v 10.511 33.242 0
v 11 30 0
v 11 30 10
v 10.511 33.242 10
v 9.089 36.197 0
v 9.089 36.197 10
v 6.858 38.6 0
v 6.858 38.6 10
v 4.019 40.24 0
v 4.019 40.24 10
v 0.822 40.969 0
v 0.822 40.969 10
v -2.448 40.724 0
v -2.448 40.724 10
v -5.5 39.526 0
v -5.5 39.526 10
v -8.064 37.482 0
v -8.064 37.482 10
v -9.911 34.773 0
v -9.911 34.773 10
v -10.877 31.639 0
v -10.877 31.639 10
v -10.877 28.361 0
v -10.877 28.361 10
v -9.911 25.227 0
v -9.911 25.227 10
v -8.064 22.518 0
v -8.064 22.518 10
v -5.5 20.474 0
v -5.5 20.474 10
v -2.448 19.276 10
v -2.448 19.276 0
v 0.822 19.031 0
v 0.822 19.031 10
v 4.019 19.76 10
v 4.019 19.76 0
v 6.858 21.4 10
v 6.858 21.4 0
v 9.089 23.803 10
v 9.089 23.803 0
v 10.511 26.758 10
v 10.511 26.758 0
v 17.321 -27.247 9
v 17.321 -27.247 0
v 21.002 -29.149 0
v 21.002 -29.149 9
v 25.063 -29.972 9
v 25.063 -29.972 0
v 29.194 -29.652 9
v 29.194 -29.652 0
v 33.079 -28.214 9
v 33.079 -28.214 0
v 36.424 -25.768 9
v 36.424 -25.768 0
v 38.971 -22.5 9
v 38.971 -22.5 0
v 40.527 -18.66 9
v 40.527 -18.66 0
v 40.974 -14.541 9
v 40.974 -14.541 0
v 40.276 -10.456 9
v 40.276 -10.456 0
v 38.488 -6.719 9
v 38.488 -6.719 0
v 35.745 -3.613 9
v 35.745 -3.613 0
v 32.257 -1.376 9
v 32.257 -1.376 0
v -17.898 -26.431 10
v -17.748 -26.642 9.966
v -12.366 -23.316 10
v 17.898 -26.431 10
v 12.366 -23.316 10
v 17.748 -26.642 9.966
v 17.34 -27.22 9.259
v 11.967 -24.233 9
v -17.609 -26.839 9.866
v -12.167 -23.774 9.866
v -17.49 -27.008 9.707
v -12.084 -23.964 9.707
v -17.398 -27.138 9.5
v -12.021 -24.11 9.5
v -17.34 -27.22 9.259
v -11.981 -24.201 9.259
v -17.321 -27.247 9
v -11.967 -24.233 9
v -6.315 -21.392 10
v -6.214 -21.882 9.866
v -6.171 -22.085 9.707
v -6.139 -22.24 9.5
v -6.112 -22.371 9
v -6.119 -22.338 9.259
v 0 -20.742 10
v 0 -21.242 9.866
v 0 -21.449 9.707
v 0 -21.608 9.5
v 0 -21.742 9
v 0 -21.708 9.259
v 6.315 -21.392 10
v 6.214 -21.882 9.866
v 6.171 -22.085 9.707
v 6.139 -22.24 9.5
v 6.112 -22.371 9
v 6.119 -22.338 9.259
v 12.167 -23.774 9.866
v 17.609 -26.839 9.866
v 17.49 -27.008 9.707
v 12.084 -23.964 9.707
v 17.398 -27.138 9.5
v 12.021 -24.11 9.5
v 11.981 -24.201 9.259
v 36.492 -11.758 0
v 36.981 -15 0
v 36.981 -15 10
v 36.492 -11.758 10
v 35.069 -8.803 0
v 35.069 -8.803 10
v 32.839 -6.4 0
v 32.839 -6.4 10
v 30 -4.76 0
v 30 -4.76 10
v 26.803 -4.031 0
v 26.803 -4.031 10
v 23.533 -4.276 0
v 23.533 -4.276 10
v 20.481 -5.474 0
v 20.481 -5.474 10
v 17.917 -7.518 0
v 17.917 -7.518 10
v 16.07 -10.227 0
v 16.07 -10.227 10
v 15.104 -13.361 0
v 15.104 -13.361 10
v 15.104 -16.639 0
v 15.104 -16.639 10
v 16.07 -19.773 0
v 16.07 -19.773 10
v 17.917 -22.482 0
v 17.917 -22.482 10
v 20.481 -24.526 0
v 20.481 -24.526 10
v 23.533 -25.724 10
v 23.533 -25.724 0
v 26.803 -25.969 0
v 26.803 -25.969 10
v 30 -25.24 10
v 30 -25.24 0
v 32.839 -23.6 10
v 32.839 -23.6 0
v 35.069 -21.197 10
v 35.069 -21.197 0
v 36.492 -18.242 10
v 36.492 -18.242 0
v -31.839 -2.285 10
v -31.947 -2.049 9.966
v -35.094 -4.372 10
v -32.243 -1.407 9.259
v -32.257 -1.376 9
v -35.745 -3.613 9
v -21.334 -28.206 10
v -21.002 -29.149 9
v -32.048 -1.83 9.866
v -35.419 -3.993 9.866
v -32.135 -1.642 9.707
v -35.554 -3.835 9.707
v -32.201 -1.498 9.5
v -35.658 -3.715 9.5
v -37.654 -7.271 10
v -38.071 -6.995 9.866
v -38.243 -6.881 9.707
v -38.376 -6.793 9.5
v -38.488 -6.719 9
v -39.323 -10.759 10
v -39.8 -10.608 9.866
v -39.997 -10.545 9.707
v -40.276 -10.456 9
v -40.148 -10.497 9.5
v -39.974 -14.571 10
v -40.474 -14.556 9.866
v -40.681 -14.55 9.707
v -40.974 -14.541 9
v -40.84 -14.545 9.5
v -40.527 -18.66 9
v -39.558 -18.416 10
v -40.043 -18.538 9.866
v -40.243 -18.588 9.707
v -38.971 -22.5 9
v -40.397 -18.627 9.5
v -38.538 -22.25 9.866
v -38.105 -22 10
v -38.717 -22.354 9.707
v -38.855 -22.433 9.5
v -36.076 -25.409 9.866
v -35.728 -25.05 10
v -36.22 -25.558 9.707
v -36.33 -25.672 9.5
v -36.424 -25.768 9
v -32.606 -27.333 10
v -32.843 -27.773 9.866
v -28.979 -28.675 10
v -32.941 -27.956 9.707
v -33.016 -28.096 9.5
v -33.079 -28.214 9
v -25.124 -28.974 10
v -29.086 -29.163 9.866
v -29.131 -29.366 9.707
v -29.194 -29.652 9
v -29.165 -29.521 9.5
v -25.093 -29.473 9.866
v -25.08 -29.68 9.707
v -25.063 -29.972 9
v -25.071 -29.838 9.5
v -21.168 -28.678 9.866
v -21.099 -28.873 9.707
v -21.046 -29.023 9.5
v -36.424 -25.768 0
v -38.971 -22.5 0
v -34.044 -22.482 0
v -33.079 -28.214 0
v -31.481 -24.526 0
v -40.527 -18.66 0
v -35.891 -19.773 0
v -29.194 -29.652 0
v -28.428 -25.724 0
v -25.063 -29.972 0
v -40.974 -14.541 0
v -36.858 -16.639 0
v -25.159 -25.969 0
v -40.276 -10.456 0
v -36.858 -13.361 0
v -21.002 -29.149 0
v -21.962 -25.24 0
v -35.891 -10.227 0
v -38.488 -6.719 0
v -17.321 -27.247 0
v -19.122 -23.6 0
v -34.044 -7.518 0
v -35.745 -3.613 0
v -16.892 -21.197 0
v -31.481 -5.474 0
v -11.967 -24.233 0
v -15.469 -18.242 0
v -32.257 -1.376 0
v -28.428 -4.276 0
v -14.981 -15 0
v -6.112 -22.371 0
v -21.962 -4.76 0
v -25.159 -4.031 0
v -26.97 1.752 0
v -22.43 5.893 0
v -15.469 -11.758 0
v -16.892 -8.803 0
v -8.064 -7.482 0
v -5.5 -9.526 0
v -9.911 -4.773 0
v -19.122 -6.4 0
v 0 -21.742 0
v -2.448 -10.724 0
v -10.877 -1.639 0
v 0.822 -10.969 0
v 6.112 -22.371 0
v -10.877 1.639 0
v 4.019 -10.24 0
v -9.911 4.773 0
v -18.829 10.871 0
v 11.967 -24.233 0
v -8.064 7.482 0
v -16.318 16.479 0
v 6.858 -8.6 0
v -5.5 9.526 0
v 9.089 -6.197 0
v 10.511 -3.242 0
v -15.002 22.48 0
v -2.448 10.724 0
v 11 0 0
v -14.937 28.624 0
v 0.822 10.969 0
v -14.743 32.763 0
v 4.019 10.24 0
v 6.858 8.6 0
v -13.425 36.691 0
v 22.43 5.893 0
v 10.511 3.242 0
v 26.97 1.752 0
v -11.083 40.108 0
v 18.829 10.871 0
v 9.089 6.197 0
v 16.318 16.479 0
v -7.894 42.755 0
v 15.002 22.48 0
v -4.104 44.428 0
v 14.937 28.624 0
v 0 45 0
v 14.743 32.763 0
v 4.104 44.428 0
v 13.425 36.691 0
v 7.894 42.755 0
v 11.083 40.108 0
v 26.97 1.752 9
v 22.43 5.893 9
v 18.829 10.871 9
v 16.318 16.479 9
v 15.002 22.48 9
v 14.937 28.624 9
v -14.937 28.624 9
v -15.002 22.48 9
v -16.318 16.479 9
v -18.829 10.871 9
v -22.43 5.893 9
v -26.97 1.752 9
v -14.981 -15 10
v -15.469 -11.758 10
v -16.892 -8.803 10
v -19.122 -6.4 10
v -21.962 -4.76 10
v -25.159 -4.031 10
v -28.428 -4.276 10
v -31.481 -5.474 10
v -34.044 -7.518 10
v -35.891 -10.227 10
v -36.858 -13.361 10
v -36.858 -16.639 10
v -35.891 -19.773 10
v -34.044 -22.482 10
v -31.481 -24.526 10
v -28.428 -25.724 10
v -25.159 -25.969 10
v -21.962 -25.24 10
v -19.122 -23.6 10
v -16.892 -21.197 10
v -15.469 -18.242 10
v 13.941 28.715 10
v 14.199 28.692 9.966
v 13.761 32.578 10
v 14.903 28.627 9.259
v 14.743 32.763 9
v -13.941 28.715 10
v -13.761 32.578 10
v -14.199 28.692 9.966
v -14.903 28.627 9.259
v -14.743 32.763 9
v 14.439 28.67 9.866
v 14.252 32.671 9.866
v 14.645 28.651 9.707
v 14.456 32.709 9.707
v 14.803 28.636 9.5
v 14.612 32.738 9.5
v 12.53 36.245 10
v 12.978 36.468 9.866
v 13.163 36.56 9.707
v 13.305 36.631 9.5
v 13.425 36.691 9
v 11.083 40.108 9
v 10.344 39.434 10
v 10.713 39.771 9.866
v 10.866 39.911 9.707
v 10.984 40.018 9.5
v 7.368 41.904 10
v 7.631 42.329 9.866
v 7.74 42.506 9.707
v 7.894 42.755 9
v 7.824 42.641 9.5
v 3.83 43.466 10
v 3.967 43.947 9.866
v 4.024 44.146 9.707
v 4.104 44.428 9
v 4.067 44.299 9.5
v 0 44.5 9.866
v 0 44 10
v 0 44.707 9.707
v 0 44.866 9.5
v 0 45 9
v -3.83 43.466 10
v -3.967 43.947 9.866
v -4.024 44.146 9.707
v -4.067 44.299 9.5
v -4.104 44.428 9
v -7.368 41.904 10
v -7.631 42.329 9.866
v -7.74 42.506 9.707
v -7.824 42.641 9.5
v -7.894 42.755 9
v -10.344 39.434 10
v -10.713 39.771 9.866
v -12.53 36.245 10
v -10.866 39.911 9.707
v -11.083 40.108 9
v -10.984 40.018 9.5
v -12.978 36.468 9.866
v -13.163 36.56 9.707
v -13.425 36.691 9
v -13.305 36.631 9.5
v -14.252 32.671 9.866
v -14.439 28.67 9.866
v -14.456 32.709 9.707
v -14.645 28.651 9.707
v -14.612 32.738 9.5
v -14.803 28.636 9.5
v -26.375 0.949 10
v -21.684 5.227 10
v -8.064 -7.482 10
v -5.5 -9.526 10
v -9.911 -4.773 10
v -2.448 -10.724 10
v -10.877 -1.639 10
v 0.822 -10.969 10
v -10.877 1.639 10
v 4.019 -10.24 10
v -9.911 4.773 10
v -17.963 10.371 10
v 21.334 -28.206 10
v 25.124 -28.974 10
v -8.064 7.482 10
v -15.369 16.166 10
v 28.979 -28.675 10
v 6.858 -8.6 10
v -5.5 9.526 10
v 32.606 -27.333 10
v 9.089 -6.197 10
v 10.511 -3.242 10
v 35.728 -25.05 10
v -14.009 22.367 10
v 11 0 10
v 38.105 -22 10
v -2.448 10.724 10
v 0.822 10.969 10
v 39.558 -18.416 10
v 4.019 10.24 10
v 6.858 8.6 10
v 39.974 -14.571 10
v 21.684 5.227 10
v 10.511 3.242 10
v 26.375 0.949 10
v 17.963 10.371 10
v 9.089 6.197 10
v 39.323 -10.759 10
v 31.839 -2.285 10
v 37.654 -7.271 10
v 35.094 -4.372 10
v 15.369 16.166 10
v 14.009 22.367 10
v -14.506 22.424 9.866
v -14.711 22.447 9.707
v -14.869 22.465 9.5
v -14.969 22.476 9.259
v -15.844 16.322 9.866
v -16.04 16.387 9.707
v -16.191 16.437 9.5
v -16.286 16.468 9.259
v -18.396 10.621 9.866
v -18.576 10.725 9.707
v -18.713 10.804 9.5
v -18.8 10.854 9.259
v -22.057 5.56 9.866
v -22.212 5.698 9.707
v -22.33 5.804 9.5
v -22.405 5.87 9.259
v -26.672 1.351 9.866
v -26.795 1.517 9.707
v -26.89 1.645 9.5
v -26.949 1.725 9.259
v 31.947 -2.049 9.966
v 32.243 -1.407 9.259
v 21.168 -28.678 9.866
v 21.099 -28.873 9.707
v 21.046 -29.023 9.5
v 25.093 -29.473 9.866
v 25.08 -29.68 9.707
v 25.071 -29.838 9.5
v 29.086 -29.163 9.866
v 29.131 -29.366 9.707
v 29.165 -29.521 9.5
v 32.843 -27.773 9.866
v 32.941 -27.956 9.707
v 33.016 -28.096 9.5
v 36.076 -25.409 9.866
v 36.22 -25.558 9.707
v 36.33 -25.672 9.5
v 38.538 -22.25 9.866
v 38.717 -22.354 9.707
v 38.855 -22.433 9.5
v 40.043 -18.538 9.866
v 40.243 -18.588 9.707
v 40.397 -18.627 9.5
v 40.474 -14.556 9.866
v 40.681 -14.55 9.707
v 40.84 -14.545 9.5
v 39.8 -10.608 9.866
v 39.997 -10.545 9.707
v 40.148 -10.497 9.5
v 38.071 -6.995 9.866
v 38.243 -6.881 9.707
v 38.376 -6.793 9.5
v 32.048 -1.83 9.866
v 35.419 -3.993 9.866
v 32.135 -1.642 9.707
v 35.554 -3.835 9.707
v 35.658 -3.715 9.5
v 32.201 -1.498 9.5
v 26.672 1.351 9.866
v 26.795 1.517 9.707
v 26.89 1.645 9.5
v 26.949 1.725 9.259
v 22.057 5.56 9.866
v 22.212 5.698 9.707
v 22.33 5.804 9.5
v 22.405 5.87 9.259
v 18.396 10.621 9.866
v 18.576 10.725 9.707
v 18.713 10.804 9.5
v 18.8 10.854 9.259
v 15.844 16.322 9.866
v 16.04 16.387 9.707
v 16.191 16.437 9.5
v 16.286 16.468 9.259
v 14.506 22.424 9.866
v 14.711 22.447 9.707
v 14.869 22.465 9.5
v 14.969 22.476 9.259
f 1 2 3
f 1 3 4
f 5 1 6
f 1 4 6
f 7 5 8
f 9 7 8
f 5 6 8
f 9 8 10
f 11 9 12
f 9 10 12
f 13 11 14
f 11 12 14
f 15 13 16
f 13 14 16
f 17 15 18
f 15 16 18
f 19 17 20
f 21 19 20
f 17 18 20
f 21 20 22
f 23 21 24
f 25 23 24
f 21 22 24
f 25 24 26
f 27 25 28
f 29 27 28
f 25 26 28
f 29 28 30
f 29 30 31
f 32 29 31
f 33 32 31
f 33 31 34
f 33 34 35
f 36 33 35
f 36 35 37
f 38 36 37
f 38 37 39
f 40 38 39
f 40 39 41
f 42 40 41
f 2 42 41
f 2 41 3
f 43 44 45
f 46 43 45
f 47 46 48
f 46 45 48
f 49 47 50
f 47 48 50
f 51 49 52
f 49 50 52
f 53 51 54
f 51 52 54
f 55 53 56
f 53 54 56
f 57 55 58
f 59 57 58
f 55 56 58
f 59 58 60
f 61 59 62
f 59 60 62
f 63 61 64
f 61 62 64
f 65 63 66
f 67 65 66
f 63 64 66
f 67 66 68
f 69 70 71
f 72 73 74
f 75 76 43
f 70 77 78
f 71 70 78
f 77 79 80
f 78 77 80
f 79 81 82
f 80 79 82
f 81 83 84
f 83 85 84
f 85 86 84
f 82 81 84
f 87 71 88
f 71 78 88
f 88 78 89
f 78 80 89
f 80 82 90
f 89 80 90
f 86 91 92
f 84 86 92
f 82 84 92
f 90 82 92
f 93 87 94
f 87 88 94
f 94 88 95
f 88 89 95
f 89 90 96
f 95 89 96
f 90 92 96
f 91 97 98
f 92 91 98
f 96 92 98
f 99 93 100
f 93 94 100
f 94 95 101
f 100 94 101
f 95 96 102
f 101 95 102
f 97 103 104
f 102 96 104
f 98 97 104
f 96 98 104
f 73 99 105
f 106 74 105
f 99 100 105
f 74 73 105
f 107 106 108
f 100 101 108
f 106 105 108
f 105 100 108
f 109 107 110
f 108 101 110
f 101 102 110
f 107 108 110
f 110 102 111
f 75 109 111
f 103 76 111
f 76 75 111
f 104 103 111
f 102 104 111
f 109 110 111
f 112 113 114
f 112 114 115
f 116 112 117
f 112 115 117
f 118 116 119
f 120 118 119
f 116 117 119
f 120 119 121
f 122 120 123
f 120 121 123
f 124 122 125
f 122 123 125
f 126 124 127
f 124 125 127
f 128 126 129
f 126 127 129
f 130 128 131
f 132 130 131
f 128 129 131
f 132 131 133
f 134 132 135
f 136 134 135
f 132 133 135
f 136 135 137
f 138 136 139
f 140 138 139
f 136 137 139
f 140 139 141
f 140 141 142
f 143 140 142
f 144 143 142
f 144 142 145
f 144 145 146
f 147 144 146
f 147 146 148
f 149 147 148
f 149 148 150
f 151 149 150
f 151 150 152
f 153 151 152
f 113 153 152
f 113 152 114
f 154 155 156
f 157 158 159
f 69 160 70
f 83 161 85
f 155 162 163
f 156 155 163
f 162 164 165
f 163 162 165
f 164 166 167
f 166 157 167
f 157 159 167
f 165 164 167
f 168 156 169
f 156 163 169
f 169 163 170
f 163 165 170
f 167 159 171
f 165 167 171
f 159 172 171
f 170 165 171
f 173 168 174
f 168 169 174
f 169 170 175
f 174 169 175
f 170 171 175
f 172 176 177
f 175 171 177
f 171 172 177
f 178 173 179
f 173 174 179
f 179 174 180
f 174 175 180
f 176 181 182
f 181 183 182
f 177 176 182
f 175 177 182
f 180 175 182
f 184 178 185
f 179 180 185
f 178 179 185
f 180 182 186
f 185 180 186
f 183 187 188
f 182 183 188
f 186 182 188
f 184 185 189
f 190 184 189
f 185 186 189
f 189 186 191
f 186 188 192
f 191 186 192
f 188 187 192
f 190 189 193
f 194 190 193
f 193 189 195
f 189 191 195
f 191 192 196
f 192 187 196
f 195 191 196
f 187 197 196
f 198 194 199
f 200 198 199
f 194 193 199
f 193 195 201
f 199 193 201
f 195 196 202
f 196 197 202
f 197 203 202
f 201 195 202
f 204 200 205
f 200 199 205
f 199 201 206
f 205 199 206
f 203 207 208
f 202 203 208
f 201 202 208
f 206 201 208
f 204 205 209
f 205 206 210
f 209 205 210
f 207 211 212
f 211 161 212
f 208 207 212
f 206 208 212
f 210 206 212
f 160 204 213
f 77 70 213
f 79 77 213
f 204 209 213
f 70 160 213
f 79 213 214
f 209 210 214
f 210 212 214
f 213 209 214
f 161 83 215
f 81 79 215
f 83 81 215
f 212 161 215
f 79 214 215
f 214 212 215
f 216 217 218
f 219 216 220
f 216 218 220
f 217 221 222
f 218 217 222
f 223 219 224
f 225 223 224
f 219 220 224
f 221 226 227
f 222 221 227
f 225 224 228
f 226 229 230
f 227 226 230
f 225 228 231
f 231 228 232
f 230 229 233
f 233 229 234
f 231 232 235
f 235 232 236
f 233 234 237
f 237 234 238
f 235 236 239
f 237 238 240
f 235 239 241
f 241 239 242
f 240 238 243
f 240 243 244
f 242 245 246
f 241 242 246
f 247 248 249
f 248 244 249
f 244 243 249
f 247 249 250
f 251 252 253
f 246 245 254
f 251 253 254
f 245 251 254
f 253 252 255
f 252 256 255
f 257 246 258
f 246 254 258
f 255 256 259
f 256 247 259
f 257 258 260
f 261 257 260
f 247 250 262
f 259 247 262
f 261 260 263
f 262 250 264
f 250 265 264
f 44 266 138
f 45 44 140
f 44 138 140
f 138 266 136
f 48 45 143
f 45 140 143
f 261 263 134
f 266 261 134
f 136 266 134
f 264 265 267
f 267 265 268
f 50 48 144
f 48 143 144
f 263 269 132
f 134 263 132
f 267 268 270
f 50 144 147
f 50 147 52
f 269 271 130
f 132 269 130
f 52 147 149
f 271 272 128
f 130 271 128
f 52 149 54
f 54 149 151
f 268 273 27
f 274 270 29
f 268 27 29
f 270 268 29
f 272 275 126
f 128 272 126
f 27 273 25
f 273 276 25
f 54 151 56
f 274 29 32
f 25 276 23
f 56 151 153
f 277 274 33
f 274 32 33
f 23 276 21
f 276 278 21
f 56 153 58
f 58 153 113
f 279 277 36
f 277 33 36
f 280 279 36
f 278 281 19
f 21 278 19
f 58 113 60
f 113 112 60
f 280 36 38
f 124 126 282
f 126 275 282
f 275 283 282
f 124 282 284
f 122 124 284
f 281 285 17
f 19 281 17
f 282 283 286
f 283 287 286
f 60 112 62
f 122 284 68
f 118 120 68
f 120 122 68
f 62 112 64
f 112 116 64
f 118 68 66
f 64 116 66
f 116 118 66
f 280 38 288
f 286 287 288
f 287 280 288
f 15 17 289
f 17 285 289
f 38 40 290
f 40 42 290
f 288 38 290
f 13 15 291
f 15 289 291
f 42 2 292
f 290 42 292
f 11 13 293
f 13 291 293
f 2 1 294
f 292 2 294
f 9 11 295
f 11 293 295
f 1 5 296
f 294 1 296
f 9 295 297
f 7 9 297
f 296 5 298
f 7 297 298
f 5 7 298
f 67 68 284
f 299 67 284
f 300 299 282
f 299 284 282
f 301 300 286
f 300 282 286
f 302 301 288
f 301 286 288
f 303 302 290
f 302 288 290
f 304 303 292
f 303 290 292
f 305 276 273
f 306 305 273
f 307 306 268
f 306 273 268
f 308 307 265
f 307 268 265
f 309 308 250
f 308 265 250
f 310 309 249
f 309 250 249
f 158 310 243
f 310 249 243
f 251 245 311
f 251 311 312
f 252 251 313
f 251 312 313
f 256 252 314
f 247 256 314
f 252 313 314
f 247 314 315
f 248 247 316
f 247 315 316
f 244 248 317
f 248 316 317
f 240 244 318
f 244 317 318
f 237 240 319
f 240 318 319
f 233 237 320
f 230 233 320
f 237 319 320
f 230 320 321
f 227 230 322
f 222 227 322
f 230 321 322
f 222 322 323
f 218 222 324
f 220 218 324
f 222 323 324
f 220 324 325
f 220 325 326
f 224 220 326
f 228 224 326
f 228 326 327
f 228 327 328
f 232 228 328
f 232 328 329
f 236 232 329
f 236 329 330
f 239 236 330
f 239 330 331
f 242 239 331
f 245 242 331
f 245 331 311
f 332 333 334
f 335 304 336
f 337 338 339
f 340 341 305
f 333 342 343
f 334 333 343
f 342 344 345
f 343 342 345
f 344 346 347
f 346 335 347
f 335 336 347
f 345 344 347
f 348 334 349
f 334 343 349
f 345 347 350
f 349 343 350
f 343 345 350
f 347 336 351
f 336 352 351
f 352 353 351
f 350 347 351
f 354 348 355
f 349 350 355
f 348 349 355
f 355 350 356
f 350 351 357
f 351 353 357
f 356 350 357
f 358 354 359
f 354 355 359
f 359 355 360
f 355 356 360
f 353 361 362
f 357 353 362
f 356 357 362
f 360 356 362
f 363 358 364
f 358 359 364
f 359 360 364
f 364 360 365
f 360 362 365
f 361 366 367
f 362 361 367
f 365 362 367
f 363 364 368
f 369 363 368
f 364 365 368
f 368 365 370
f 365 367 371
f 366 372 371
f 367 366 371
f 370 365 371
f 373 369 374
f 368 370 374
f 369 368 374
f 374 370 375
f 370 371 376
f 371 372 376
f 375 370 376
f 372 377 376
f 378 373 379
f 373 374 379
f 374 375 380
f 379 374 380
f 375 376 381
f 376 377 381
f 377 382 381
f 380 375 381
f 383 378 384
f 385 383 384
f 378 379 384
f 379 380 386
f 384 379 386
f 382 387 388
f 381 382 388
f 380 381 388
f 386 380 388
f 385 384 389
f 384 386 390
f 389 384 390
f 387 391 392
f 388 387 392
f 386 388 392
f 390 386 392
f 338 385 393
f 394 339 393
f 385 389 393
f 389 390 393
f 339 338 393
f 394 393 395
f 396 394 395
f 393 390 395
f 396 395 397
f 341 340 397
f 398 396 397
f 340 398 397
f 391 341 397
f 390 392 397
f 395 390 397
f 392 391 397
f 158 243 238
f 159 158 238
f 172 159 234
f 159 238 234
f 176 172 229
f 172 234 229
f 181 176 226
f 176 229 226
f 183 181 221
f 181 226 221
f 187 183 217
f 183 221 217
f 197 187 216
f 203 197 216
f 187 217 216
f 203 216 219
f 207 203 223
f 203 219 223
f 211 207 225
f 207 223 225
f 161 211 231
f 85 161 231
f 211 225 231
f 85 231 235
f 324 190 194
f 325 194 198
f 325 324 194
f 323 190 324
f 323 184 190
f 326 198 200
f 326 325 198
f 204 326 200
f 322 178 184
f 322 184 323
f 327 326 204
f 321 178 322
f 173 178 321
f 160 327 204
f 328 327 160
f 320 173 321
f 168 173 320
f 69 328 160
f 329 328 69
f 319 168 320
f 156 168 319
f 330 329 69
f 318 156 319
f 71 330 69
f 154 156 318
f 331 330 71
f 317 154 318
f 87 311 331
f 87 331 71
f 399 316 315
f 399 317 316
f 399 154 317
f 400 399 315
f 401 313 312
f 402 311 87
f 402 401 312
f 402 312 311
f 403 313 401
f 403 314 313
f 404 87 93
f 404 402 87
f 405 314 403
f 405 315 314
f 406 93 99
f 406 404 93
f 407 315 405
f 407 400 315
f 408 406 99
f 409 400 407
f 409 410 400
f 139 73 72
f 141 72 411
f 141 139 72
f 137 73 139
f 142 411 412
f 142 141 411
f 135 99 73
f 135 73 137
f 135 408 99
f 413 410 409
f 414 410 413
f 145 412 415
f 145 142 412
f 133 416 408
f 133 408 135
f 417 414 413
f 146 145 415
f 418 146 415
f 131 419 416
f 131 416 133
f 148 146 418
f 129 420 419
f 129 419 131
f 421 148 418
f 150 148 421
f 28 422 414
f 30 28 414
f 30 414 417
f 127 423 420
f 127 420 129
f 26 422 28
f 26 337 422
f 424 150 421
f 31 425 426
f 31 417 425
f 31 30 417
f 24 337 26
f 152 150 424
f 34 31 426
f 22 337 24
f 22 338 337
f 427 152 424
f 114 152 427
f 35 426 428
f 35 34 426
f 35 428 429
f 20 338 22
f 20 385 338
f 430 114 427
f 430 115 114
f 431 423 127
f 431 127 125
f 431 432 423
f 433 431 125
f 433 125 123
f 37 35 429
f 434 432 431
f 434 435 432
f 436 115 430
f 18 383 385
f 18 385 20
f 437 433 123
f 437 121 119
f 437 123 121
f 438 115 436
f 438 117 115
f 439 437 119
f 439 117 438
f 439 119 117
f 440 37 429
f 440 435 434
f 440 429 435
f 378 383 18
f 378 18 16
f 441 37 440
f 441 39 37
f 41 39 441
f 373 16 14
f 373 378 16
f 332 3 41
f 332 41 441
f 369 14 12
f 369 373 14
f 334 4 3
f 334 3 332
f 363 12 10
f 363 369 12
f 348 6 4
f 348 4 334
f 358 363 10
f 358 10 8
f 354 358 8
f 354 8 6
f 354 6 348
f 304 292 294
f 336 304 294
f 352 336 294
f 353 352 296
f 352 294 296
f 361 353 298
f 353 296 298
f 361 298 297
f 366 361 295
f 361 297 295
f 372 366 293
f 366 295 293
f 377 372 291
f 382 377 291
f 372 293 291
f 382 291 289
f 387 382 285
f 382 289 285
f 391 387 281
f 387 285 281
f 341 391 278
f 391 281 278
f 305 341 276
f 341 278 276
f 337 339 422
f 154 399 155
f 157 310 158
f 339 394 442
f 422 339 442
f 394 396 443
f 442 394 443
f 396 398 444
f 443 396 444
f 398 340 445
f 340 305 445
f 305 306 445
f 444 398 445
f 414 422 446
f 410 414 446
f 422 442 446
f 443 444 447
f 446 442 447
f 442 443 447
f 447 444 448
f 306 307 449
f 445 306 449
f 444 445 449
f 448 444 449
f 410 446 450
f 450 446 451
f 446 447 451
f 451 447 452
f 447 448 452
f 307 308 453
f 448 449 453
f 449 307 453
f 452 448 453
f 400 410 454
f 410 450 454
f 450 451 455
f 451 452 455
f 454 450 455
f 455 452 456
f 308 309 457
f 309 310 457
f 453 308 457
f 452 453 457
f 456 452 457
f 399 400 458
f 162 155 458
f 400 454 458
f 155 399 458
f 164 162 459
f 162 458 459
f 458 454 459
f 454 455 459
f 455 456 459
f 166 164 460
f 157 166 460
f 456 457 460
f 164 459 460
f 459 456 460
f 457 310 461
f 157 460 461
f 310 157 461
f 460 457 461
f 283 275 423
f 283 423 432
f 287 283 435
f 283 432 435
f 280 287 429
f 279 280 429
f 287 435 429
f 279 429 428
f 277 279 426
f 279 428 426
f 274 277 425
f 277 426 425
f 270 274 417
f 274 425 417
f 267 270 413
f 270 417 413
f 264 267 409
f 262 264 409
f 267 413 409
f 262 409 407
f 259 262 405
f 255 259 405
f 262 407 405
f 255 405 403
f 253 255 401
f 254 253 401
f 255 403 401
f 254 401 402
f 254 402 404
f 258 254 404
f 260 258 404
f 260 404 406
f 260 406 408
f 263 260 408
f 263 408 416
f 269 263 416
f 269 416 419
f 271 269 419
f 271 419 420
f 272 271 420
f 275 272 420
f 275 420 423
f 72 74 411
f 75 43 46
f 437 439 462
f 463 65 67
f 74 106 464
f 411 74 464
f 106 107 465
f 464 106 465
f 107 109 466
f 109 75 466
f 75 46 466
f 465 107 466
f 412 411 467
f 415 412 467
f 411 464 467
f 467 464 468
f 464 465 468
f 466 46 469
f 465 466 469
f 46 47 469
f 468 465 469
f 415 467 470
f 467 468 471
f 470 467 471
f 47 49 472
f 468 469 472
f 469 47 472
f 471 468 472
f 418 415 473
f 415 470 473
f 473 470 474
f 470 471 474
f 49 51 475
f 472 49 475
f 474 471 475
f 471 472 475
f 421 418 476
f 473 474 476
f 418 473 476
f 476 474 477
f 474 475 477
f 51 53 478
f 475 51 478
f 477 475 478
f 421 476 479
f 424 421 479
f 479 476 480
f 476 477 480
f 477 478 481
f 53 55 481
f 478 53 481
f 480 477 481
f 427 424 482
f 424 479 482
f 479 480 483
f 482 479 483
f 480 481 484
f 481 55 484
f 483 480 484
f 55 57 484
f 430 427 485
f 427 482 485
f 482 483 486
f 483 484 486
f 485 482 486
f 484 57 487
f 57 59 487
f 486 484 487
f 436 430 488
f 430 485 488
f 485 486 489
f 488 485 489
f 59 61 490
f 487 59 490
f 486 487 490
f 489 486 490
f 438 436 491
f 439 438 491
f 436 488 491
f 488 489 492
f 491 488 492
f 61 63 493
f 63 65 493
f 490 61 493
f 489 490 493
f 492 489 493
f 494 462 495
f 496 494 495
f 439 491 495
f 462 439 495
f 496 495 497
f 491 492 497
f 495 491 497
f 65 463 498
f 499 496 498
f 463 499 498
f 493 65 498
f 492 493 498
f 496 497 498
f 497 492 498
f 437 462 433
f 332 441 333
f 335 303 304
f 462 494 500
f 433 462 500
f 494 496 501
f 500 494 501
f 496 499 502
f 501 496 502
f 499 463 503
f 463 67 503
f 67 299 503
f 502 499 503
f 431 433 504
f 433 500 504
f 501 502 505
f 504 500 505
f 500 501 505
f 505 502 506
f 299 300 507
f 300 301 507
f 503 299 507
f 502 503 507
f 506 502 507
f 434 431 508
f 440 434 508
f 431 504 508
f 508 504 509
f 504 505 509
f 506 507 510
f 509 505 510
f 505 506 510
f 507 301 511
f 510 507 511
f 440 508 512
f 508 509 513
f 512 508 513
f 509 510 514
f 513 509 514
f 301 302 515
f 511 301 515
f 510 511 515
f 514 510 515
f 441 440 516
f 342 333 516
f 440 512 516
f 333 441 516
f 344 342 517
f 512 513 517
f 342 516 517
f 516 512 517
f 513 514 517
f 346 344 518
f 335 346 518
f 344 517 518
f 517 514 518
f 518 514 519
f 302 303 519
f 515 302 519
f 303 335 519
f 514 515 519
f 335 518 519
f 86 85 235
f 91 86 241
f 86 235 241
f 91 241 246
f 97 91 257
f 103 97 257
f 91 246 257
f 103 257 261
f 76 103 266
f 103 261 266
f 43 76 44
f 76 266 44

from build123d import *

# Parameters (mm, degrees)
F1_DEPTH = 10
F2_R     = 11
F3_DEPTH = 10.001
F4_R     = 1


with BuildPart() as f1:
    # F0 (on Top) → F1 (new body)
    with BuildSketch(Plane.XY):
        with BuildLine():
            ThreePointArc((32.257237, -1.376276), (18.829424, 10.871173), (14.936729, 28.623724))
            ThreePointArc((14.936729, 28.623724), (0, 45), (-14.936729, 28.623724))
            ThreePointArc((-14.936729, 28.623724), (-18.829424, 10.871173), (-32.257237, -1.376276))
            ThreePointArc((-32.257237, -1.376276), (-38.971143, -22.5), (-17.320508, -27.247449))
            ThreePointArc((-17.320508, -27.247449), (0, -21.742346), (17.320508, -27.247449))
            ThreePointArc((17.320508, -27.247449), (38.971143, -22.5), (32.257237, -1.376276))
        make_face()
    extrude(amount=F1_DEPTH)

    # F2 (on face) → F3 (cut, through all)
    with BuildSketch(Plane.XY.offset(10)):
        with Locations((-25.980762, -15)):
            Circle(F2_R)
        Circle(F2_R)
        with Locations((0, 30)):
            Circle(F2_R)
        with Locations((25.980762, -15)):
            Circle(F2_R)
    extrude(amount=-F3_DEPTH, mode=Mode.SUBTRACT)

    # F4
    f4_edges = [f1.edges().sort_by_distance(p)[0] for p in [
        (0, -21.742346, 10),
    ]]
    fillet(f4_edges, radius=F4_R)


solid = f1.part
